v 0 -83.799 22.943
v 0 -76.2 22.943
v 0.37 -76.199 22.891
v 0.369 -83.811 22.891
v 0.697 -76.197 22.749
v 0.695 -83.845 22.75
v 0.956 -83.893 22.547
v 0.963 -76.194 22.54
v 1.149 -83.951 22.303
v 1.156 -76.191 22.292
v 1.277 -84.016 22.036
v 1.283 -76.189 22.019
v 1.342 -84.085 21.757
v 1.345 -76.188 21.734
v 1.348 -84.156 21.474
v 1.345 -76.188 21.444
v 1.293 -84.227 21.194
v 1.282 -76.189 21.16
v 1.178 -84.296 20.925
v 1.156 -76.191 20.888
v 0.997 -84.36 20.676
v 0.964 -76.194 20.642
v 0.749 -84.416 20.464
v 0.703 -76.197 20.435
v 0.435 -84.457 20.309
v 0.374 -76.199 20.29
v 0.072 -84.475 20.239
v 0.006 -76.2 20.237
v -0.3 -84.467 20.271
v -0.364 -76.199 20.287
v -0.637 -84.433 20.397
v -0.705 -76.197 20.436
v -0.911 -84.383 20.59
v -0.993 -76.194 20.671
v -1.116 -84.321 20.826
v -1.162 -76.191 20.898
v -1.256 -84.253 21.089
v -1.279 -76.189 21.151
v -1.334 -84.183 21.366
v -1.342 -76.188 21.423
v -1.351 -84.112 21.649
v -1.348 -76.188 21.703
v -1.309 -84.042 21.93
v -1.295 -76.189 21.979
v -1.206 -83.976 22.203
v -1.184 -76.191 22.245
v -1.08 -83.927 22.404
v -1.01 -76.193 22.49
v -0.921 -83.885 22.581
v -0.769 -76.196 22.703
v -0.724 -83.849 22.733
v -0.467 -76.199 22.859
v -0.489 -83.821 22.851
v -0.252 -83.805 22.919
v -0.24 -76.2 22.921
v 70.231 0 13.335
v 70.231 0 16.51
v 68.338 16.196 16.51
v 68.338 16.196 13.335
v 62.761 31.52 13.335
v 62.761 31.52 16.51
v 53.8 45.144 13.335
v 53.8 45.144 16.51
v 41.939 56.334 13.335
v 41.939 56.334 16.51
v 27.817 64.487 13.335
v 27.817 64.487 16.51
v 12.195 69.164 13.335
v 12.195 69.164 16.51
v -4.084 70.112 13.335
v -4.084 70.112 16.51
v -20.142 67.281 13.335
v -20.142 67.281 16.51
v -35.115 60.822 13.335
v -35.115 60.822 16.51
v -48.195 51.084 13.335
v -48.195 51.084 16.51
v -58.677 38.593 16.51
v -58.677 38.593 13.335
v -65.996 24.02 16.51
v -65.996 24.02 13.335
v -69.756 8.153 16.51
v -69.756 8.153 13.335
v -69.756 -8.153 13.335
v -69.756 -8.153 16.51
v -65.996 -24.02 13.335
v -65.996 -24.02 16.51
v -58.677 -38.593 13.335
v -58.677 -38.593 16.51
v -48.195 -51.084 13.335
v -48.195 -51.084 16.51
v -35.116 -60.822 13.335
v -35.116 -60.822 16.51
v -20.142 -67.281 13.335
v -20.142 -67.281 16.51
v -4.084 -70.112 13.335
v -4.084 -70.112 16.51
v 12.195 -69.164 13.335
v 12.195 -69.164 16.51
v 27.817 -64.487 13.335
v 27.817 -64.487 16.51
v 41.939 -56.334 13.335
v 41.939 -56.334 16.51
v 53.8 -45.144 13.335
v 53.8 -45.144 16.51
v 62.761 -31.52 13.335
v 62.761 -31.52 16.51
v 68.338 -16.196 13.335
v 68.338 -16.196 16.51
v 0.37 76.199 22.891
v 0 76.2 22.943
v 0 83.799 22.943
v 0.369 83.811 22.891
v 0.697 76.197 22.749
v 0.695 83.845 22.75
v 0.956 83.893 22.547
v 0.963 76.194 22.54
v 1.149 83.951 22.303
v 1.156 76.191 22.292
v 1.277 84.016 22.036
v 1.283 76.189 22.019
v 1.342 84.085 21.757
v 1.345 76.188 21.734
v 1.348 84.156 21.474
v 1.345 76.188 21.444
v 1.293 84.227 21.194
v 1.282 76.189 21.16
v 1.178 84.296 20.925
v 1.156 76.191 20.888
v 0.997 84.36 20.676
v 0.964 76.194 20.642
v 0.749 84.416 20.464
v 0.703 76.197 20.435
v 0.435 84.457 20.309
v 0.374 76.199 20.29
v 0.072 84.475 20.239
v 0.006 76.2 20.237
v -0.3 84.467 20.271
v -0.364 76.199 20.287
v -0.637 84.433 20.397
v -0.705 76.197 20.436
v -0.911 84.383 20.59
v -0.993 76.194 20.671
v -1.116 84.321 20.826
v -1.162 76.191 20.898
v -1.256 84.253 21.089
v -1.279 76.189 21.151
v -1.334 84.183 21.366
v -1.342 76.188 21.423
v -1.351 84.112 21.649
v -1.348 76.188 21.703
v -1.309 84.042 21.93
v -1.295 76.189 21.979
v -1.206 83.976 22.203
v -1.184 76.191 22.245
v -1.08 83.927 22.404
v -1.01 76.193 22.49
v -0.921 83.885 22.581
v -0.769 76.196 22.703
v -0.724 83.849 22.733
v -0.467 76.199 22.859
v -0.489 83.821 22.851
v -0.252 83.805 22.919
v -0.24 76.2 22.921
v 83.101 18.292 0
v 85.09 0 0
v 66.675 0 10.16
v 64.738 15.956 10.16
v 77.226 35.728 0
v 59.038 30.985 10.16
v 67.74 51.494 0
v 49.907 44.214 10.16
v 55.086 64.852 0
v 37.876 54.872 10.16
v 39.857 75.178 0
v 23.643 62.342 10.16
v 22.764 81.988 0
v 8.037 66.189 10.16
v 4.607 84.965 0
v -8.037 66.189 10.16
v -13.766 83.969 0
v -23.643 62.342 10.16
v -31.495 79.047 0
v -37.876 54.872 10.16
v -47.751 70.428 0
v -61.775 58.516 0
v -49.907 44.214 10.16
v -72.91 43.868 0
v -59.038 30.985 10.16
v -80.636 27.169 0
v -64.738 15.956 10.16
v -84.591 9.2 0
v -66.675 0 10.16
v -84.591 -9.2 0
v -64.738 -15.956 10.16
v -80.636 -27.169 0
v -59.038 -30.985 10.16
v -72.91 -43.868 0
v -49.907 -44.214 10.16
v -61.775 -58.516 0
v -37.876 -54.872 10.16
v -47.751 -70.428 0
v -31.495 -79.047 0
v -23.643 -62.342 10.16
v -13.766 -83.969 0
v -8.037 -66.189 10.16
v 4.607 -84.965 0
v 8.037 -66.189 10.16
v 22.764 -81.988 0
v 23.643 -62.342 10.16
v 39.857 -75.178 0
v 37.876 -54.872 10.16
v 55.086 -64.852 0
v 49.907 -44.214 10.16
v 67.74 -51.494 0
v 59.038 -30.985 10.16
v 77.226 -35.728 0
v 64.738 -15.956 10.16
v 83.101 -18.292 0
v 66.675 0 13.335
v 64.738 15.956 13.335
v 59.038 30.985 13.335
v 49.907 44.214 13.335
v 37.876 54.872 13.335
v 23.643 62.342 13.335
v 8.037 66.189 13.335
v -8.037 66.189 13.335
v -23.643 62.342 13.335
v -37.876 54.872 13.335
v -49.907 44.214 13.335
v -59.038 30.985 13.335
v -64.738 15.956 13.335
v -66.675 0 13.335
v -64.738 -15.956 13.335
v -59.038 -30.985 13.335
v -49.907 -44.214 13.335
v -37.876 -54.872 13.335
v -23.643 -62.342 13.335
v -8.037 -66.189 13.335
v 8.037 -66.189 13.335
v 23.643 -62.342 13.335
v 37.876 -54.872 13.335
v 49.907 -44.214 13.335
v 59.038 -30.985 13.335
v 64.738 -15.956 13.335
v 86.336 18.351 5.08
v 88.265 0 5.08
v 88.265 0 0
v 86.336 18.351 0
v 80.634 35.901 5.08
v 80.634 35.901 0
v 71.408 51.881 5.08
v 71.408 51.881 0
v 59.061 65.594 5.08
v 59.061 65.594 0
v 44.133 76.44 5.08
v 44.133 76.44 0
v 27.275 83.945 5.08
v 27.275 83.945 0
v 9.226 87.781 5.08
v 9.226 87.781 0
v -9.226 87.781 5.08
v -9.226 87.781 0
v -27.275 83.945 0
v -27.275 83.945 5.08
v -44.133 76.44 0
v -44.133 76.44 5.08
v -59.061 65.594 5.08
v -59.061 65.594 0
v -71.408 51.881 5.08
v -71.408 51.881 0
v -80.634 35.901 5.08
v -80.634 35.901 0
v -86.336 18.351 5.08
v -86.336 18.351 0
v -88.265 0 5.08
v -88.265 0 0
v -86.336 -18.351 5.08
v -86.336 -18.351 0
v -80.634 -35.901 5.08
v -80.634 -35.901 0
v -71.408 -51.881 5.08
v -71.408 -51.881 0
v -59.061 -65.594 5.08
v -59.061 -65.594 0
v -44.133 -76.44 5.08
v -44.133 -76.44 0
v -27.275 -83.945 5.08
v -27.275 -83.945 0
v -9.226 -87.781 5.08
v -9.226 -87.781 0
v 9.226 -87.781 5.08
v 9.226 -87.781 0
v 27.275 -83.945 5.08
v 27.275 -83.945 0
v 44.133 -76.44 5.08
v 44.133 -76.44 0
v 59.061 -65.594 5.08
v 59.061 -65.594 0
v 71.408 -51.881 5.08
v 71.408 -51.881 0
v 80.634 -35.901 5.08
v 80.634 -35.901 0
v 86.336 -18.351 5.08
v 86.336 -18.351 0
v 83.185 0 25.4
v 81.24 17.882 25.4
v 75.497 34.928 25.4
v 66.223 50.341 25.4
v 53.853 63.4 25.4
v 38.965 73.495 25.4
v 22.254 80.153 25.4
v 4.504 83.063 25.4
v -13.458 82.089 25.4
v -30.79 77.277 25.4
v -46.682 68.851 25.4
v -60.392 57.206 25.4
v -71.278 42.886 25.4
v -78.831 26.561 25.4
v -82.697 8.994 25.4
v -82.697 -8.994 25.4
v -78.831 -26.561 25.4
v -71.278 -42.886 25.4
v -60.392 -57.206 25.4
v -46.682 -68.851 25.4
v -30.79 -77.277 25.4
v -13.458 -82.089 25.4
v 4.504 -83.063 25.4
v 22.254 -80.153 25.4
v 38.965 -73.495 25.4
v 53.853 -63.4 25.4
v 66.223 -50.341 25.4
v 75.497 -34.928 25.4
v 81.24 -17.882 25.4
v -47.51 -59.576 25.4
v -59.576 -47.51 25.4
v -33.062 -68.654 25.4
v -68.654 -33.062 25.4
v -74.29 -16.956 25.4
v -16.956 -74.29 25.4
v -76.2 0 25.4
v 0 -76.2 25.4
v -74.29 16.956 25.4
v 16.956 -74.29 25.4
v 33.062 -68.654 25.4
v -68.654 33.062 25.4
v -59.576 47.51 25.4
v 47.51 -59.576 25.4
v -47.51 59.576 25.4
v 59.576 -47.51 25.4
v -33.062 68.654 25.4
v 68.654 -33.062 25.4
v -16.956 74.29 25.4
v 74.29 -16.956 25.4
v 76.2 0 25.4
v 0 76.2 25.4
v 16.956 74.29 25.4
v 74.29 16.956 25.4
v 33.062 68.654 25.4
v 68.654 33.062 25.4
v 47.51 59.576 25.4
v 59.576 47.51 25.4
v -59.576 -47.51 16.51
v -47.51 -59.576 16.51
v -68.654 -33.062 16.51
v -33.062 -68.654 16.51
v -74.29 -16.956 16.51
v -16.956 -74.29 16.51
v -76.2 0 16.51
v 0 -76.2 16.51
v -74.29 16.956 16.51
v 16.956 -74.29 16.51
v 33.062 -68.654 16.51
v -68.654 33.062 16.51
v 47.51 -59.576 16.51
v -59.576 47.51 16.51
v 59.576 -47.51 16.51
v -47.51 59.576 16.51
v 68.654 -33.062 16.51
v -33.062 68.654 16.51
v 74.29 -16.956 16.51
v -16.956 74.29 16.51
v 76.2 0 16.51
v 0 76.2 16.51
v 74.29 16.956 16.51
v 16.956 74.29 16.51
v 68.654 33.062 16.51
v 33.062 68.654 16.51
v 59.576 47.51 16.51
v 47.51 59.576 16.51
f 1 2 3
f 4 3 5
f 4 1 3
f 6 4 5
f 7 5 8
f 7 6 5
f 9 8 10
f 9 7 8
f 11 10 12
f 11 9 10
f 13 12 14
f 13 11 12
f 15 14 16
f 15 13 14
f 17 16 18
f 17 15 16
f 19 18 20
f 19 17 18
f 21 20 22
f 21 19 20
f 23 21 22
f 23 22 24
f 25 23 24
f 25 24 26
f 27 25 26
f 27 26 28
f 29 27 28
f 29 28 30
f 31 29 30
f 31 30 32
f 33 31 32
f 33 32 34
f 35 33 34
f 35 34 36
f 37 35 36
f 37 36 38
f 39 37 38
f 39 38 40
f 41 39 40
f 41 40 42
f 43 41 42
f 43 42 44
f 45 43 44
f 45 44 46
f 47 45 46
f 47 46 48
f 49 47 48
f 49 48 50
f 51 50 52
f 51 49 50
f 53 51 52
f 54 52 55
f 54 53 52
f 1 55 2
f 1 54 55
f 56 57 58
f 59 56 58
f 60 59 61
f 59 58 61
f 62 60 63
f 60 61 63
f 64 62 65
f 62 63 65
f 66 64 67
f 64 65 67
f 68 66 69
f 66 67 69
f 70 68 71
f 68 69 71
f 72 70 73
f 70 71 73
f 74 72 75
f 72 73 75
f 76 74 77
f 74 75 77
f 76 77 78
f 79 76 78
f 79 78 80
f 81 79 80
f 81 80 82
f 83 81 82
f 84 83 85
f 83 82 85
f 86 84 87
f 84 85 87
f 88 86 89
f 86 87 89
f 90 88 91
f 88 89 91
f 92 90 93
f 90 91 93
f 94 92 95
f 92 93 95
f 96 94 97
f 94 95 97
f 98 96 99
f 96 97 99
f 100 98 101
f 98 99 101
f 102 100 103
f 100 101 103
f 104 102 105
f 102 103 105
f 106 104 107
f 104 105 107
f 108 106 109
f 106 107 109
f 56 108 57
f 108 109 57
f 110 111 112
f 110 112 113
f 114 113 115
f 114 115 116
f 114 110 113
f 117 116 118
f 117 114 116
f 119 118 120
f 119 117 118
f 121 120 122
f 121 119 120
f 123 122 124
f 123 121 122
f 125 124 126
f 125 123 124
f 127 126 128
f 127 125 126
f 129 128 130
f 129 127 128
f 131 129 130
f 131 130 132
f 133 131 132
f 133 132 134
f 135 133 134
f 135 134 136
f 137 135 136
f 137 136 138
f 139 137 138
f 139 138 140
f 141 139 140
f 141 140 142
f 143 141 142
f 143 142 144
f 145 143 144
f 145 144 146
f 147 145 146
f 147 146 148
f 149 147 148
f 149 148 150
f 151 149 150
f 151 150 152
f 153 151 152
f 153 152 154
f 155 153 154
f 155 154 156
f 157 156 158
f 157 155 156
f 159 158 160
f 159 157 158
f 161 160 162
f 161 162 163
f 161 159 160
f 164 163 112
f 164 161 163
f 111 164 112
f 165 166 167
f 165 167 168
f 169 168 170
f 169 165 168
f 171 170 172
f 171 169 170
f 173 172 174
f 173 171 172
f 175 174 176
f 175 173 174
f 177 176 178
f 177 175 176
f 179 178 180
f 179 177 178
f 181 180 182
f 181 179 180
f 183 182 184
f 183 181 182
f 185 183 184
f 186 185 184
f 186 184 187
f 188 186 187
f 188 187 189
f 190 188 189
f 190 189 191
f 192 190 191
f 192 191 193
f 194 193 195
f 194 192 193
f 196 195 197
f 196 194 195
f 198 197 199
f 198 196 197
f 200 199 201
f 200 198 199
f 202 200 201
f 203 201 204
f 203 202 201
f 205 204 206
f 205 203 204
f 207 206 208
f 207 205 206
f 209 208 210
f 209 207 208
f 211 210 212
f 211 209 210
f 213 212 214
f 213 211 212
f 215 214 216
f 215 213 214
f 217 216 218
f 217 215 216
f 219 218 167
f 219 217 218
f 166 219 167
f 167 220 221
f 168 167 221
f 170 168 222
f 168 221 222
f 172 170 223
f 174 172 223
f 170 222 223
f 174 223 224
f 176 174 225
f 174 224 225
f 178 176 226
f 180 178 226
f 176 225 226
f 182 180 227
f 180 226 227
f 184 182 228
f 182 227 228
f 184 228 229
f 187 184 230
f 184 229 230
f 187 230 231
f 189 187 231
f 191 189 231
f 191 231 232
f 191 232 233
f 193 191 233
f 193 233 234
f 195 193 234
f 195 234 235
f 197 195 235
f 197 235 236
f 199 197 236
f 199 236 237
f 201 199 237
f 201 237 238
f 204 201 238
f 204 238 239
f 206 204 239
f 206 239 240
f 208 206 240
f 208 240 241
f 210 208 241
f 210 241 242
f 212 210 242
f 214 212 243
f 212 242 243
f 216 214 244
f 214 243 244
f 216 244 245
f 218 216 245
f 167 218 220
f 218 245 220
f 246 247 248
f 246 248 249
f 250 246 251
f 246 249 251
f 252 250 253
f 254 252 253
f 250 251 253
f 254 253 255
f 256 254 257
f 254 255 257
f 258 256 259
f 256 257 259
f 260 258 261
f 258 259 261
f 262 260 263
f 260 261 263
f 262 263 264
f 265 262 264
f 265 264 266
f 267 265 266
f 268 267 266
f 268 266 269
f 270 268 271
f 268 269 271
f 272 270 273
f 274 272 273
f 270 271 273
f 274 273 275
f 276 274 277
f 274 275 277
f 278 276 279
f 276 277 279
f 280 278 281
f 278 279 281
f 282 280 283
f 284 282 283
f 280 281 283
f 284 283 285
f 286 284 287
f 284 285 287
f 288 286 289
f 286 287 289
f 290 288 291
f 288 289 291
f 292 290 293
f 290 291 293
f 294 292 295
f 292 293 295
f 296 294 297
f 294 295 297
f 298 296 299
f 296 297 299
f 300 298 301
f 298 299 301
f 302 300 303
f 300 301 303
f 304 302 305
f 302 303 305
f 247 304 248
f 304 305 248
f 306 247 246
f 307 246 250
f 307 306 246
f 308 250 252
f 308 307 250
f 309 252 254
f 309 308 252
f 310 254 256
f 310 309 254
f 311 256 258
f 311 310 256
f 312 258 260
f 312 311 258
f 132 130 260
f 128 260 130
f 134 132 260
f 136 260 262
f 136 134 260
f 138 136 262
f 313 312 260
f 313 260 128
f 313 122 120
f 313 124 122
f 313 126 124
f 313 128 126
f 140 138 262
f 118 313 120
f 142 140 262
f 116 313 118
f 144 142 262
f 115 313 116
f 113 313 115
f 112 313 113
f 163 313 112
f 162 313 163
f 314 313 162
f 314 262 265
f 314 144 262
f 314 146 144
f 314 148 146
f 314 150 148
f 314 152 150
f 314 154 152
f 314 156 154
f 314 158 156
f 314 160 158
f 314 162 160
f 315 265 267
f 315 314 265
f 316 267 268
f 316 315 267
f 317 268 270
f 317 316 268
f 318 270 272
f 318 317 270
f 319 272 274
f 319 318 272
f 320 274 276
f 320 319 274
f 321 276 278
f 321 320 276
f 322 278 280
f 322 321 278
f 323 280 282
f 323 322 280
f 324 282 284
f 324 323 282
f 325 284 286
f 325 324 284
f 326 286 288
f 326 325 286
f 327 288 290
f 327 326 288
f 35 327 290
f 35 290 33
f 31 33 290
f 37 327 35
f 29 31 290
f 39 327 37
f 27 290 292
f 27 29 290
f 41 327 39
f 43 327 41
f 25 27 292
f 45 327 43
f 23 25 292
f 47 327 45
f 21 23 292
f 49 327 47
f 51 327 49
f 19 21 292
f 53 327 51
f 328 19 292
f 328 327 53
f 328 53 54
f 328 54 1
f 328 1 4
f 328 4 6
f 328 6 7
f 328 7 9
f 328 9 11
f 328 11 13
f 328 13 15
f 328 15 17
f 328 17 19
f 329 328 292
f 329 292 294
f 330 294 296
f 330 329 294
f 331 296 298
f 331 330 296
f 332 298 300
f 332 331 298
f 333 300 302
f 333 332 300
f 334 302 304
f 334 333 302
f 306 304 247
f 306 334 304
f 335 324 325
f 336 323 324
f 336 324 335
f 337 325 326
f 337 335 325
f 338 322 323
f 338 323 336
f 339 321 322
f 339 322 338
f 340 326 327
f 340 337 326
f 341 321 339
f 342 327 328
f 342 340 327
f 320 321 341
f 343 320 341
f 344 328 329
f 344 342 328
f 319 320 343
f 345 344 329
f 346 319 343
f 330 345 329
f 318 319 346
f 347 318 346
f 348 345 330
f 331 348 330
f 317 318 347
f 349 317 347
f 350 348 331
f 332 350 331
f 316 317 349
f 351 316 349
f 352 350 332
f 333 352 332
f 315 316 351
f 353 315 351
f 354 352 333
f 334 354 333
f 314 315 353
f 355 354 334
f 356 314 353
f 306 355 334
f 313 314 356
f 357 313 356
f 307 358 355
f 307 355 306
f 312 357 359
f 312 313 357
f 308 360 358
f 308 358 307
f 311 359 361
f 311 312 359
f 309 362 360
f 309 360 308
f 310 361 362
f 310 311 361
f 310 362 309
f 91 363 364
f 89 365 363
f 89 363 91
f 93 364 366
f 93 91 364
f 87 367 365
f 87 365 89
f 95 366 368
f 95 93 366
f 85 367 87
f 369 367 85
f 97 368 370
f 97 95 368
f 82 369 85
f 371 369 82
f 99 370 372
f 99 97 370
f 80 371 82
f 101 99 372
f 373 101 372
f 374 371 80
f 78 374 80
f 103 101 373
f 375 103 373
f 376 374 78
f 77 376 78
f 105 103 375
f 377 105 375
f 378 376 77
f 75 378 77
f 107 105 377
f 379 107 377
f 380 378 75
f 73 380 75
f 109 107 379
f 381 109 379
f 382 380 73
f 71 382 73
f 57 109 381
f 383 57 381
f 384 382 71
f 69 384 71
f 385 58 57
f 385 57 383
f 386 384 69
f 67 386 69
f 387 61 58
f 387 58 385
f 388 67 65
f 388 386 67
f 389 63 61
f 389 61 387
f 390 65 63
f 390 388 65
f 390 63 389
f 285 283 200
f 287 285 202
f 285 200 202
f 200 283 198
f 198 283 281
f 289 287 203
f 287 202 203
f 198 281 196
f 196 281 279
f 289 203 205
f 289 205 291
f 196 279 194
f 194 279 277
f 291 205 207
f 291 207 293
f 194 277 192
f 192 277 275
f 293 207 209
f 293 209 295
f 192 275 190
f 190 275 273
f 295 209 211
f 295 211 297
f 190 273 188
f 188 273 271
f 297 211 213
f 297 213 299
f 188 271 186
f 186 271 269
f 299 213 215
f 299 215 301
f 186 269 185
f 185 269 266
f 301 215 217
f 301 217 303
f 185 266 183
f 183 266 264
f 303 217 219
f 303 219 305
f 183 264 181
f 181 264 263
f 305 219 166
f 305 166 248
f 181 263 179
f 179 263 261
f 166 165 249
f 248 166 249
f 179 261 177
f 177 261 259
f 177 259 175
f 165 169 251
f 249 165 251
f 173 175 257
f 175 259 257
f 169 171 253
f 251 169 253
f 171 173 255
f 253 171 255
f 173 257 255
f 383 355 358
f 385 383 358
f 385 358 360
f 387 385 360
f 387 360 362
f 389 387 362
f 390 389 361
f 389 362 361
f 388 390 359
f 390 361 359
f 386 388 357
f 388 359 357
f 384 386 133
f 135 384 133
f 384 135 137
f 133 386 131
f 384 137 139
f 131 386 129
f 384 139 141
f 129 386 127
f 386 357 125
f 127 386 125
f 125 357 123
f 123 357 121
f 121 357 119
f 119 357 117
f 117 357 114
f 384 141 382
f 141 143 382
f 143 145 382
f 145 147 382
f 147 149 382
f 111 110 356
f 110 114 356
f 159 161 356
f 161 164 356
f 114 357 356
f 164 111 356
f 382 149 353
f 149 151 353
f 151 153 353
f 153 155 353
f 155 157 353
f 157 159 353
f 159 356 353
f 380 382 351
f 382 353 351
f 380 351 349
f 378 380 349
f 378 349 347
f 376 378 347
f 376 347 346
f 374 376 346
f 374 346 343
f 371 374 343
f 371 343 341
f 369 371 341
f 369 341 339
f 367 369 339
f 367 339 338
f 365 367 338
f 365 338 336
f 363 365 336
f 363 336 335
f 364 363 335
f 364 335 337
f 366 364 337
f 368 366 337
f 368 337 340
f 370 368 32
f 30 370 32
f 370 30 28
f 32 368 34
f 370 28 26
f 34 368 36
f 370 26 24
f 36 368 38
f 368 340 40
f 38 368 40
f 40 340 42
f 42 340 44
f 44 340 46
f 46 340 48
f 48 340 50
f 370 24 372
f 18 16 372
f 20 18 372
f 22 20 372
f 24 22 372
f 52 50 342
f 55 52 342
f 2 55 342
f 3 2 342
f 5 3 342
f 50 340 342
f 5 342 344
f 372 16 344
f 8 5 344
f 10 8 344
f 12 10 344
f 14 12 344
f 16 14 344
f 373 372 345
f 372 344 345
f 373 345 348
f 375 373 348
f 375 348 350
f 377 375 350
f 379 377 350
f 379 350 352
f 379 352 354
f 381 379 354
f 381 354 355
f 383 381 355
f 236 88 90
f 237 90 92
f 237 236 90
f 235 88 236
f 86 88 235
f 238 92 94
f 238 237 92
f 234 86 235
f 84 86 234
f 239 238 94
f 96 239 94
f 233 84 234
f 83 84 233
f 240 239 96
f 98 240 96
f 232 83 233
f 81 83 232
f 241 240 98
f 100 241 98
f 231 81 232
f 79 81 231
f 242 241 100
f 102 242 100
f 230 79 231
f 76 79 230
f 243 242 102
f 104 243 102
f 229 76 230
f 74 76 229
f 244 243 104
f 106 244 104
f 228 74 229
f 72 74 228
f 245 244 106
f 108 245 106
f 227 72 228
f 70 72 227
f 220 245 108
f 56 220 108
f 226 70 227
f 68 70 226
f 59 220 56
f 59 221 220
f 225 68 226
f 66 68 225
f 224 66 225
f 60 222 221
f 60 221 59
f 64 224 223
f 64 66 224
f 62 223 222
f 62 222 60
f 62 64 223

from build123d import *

# Parameters (mm, degrees)
SKETCH1_R               = 88.265
BOSS_EXTRUDE1_DEPTH     = 25.4
SKETCH2_R               = 76.2
CUT_EXTRUDE1_DEPTH      = 8.89
SKETCH3_R               = 70.231
CUT_EXTRUDE2_DEPTH      = 3.175
SKETCH4_R               = 66.675
CUT_EXTRUDE3_DEPTH      = 126.535822278
CHAMFER1_SIZE           = 10.16
CHAMFER1_SIZE2          = 18.415
CHAMFER2_SIZE           = 20.32
CHAMFER2_SIZE2          = 5.08
CUT_EXTRUDE4_DEPTH      = 128.383595686
CUT_EXTRUDE4_DEPTH_BACK = 128.383595686
SKETCH5_R               = 1.35255


with BuildPart() as part:
    # Sketch1 → Boss-Extrude1 (new body)
    with BuildSketch(Plane.XY):
        Circle(SKETCH1_R)
    extrude(amount=BOSS_EXTRUDE1_DEPTH)

    # Sketch2 → Cut-Extrude1 (cut)
    with BuildSketch(Plane.XY.offset(25.4)):
        Circle(SKETCH2_R)
    extrude(amount=-CUT_EXTRUDE1_DEPTH, mode=Mode.SUBTRACT)

    # Sketch3 → Cut-Extrude2 (cut)
    with BuildSketch(Plane.XY.offset(16.51)):
        Circle(SKETCH3_R)
    extrude(amount=-CUT_EXTRUDE2_DEPTH, mode=Mode.SUBTRACT)

    # Sketch4 → Cut-Extrude3 (cut, through all)
    with BuildSketch(Plane.XY.offset(13.335)):
        Circle(SKETCH4_R)
    extrude(amount=-CUT_EXTRUDE3_DEPTH, mode=Mode.SUBTRACT)

    # Chamfer1
    chamfer1_edges = [part.edges().sort_by_distance(p)[0] for p in [
        (-66.675, 0, 0),
    ]]
    chamfer1_side = [part.faces().sort_by_distance(p)[0] for p in [
        (-66.675, 0, 6.6675),
    ]]
    chamfer(chamfer1_edges, length=CHAMFER1_SIZE, length2=CHAMFER1_SIZE2, reference=chamfer1_side[0])

    # Chamfer2
    chamfer2_edges = [part.edges().sort_by_distance(p)[0] for p in [
        (-88.265, 0, 25.4),
    ]]
    chamfer2_side = [part.faces().sort_by_distance(p)[0] for p in [
        (-88.265, 0, 12.7),
    ]]
    chamfer(chamfer2_edges, length=CHAMFER2_SIZE, length2=CHAMFER2_SIZE2, reference=chamfer2_side[0])

    # Sketch5 → Cut-Extrude4 (cut, two sides: drawn at the far end of the back side and taken through both)
    with BuildSketch(Plane(origin=(0, 0, 0), x_dir=(1, 0, 0), z_dir=(0, 1, 0)).offset(-CUT_EXTRUDE4_DEPTH_BACK)):
        with Locations(Location((0, -21.59, 0), (0, 0, 270))):
            Circle(SKETCH5_R)
    extrude(amount=CUT_EXTRUDE4_DEPTH + CUT_EXTRUDE4_DEPTH_BACK, mode=Mode.SUBTRACT)


solid = part.part
